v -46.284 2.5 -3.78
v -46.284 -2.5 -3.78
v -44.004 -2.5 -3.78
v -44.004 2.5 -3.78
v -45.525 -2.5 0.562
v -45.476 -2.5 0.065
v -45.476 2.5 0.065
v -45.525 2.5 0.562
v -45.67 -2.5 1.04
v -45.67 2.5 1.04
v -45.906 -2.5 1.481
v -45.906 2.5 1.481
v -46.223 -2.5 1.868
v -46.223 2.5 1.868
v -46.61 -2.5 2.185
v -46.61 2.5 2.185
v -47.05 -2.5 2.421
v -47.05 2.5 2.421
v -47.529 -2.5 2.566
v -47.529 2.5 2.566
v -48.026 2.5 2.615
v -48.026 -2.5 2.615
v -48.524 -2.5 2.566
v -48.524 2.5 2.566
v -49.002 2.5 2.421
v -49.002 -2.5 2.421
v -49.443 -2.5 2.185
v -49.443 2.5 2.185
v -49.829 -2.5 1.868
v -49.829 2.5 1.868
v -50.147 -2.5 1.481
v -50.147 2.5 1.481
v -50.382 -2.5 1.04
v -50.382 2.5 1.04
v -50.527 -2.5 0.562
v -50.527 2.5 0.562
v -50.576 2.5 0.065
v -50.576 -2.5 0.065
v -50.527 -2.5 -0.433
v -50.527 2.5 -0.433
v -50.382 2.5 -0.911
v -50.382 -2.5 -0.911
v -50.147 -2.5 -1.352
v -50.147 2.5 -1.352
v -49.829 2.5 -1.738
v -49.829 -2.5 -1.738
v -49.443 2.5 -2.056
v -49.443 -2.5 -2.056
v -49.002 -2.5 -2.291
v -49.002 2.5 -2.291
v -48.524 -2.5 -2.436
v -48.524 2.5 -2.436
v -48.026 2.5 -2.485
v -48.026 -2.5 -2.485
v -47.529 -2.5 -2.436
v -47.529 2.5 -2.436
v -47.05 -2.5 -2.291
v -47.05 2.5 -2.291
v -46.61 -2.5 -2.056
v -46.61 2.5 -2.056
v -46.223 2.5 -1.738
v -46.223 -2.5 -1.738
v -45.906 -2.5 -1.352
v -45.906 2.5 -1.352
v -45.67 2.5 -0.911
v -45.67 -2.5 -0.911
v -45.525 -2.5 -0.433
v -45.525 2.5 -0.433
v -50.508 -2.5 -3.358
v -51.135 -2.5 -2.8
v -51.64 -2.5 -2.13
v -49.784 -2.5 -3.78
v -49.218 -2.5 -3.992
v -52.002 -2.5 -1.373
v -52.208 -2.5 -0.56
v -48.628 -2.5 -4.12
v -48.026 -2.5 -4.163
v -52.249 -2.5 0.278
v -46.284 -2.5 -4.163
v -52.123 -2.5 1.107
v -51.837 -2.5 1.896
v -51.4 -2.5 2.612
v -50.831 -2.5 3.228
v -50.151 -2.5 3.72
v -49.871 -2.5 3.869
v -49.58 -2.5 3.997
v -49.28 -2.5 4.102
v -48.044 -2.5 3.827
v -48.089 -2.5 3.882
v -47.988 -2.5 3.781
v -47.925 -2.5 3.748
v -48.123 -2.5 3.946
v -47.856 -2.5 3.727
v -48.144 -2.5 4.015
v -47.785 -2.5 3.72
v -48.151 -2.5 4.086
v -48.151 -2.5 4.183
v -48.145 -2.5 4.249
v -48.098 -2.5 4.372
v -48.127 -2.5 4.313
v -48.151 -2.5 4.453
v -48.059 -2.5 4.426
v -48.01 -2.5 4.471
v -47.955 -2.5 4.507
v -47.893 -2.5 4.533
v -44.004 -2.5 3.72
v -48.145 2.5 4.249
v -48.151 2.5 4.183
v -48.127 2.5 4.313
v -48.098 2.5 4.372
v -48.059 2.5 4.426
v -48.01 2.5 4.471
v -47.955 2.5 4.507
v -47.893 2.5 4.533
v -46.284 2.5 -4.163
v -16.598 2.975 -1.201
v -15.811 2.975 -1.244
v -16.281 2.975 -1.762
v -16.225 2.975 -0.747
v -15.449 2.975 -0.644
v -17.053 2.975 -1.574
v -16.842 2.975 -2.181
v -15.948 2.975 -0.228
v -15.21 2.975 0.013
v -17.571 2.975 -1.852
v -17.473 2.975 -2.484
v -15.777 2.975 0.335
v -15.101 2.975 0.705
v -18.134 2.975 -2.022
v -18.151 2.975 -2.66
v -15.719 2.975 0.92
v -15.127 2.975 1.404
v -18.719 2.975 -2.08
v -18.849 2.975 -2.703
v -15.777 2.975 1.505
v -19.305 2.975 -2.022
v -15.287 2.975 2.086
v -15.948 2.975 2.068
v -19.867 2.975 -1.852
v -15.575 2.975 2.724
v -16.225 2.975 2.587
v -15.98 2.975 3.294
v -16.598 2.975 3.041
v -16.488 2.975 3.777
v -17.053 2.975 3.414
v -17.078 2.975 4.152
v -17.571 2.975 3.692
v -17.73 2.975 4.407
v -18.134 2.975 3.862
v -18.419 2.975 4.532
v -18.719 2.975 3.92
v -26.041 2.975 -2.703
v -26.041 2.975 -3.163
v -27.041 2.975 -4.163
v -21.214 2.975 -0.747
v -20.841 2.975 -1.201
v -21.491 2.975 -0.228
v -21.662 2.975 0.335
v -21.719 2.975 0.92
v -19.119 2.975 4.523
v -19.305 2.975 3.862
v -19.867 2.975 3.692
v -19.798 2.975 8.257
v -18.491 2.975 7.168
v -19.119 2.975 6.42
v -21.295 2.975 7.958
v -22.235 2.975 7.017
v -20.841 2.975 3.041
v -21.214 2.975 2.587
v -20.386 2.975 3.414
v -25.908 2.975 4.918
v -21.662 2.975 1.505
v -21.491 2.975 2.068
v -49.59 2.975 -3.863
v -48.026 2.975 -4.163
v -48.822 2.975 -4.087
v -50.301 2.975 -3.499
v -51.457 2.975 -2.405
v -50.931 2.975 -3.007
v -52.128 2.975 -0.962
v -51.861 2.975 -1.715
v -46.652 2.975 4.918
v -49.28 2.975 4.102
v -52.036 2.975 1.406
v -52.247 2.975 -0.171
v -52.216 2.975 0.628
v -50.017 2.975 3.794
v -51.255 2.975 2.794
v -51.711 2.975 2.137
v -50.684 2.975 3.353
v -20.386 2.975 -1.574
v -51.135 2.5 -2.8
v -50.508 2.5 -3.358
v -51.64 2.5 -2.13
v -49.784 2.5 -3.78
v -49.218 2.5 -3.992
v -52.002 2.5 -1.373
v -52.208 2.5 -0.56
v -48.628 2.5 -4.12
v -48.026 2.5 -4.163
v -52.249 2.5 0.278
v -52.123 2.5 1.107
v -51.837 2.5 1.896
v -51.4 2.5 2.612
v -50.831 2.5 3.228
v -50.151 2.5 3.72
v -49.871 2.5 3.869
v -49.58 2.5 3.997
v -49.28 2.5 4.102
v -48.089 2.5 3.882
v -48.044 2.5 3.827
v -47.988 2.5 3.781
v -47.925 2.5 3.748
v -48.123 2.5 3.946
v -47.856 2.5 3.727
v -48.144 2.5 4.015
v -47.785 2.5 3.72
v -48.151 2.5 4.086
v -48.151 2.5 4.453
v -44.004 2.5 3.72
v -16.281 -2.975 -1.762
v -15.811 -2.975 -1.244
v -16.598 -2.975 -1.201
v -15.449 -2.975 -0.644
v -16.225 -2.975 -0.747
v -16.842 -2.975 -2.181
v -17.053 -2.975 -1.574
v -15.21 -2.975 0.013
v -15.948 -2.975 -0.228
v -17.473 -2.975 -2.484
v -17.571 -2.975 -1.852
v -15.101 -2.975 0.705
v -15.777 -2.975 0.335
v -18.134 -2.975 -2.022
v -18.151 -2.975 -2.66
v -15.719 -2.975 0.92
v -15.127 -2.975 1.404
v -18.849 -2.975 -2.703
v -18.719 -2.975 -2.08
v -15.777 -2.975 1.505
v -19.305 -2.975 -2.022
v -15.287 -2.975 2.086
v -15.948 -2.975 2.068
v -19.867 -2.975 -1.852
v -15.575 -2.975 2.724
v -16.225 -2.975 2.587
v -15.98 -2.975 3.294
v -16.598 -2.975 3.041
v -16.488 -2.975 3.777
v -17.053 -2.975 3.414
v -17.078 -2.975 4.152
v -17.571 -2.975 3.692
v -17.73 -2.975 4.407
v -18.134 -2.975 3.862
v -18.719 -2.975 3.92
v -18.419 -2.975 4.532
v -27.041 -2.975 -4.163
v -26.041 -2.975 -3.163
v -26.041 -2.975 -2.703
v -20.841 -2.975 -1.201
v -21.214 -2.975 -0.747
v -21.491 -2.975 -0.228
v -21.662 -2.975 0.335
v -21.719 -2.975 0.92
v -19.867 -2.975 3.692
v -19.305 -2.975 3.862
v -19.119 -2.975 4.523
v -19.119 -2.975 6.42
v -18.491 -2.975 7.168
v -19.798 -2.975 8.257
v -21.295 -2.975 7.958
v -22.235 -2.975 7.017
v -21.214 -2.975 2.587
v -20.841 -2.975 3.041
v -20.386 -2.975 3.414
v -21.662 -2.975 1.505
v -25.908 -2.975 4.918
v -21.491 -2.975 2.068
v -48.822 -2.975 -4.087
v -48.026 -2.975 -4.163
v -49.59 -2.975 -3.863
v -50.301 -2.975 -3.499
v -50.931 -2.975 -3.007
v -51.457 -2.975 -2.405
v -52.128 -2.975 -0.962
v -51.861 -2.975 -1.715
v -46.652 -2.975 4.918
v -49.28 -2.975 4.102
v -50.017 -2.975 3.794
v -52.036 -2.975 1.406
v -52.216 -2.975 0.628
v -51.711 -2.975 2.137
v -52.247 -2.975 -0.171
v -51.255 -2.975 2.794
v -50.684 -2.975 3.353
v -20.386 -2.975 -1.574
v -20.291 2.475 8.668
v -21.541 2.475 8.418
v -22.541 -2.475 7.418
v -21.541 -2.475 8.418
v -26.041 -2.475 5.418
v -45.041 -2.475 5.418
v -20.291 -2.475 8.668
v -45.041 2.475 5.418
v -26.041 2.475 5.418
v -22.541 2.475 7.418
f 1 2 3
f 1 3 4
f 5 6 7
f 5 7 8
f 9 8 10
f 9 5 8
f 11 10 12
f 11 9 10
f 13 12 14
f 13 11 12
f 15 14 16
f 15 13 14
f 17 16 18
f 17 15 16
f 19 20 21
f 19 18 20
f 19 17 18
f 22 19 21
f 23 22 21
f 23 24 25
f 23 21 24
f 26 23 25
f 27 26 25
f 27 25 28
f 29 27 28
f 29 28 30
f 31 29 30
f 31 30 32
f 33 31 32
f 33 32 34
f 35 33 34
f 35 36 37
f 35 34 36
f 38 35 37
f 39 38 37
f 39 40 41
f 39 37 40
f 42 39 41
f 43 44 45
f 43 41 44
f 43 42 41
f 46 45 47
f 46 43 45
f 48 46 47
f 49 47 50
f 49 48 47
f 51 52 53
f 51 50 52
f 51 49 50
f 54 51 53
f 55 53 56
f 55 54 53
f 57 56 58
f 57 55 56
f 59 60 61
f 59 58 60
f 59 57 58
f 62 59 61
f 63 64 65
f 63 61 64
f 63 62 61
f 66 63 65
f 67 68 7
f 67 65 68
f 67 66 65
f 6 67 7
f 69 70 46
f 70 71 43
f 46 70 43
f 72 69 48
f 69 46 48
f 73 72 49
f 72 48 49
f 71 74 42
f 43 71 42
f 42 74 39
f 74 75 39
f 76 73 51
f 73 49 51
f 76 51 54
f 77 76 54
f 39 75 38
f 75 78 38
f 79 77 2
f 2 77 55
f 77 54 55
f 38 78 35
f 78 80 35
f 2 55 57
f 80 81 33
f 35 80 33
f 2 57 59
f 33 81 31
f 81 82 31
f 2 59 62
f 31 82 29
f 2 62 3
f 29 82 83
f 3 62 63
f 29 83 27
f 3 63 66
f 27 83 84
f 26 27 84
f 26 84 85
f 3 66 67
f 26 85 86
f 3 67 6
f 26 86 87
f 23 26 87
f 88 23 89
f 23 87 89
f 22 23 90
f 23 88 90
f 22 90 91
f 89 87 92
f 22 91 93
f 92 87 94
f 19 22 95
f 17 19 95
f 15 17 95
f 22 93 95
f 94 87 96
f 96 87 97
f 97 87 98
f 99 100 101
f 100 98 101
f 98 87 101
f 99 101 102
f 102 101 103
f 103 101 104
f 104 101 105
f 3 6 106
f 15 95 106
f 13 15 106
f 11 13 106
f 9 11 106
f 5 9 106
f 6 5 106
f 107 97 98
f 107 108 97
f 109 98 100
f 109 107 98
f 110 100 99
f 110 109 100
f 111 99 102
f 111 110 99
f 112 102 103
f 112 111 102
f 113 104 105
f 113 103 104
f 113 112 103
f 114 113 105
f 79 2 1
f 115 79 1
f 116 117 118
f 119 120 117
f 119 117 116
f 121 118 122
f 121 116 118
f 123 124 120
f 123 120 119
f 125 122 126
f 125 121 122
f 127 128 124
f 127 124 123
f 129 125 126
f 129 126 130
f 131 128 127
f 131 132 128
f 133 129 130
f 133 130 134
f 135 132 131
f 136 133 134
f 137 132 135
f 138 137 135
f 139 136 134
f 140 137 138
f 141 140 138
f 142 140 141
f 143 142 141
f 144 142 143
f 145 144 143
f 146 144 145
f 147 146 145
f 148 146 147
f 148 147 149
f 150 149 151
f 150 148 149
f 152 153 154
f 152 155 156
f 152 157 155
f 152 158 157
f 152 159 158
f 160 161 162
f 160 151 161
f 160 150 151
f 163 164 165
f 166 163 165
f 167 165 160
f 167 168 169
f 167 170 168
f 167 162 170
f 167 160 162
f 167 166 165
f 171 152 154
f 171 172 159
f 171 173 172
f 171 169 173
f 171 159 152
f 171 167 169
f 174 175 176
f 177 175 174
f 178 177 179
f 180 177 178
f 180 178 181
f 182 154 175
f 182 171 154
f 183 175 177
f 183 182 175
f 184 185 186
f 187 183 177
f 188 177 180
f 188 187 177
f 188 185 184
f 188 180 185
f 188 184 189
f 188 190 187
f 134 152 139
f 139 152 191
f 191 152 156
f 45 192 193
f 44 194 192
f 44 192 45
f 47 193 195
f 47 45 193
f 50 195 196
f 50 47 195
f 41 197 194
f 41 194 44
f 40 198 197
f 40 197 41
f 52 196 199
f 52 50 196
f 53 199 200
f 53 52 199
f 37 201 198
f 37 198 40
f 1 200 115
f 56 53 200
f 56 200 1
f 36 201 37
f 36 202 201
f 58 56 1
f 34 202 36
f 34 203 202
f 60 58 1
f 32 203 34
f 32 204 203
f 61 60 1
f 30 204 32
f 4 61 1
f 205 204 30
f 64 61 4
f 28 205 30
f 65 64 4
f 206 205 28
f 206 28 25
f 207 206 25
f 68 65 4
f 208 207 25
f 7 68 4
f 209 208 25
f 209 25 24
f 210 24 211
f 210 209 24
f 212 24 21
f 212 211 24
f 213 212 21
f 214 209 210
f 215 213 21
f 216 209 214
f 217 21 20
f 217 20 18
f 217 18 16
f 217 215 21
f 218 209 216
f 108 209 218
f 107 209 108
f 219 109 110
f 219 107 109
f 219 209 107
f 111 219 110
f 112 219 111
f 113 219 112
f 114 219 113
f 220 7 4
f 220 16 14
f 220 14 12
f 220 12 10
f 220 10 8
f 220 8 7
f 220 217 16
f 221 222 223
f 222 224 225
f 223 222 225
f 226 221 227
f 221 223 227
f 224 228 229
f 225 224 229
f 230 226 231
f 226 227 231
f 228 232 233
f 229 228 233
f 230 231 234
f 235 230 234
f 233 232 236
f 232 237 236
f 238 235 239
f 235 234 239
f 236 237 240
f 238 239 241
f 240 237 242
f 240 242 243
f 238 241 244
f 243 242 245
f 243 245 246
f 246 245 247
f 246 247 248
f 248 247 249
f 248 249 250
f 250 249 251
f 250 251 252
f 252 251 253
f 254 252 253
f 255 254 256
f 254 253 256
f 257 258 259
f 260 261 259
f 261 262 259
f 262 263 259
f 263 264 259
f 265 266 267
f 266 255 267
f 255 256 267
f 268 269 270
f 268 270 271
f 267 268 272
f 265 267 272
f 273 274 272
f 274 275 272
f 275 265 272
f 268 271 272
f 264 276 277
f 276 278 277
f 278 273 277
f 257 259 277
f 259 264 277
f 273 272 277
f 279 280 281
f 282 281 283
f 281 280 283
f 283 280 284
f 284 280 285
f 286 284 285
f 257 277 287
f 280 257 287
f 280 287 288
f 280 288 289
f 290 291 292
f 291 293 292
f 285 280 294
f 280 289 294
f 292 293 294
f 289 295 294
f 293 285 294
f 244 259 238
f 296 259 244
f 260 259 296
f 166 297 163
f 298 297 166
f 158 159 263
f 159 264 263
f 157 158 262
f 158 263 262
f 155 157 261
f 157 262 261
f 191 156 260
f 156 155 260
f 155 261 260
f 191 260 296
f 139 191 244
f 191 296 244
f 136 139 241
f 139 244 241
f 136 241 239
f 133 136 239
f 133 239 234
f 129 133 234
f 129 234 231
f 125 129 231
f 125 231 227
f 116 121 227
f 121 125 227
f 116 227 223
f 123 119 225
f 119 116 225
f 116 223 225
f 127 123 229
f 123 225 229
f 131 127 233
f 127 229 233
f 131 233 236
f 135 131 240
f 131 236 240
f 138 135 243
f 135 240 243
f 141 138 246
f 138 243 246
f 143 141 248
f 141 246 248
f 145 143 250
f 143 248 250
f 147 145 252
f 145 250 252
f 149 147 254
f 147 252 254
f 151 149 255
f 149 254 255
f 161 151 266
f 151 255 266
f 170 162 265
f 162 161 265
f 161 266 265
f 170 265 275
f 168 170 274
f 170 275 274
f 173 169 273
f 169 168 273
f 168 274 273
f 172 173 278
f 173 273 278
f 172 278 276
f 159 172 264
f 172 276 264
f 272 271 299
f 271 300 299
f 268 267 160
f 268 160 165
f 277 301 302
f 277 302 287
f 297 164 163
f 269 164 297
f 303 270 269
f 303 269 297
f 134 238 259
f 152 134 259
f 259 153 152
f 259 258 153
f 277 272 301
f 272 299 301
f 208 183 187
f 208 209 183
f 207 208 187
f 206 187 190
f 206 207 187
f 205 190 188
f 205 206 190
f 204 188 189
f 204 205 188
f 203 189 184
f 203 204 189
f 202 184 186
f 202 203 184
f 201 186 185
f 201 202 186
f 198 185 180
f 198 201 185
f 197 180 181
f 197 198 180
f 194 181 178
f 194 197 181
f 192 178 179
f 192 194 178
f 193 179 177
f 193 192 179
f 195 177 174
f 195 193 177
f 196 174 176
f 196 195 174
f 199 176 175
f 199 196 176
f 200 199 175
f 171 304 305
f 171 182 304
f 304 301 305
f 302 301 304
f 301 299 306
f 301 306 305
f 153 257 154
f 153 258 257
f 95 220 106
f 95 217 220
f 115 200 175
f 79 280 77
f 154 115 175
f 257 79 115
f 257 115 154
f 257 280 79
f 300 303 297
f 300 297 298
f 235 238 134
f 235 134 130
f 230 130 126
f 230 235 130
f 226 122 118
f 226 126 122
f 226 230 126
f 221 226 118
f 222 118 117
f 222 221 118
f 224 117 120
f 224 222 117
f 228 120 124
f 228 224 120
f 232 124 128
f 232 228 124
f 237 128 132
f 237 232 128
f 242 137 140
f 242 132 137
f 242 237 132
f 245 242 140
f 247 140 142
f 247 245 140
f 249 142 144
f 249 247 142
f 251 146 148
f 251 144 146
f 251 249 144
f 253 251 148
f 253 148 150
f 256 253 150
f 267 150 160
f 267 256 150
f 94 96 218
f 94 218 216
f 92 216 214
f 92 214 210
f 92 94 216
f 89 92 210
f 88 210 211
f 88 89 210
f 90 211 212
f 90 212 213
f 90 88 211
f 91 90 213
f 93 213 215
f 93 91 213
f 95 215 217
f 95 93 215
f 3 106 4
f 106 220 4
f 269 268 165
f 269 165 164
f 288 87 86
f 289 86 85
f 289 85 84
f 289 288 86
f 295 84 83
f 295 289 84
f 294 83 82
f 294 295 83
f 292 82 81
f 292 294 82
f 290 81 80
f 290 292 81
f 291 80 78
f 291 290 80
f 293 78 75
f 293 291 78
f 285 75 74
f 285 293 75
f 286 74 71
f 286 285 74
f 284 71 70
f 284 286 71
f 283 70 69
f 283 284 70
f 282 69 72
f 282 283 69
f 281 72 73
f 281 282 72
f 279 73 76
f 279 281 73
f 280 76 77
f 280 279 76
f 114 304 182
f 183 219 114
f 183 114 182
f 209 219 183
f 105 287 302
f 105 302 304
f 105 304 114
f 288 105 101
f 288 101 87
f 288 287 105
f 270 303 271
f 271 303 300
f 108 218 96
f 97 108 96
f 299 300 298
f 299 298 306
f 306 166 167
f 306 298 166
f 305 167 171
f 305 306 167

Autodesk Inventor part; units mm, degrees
ref_plane "YZ Plane" through (0, 0, 0) normal (1, 0, 0) x (0, 1, 0)
ref_plane "XZ Plane" through (0, 0, 0) normal (0, 1, 0) x (-1, 0, 0)
sketch "Sketch1" plane through (0, 0, 0) normal (0, 1, 0) x (-1, 0, 0)
  circle A0 centre (18.719305, 0.91995) radius 3.625
  line L0 (19.118903, 4.522858) -> (19.118903, 6.41995)
  line L1 (19.118903, 6.41995) -> (18.491054, 7.168191)
  line L2 (18.491054, 7.168191) -> (20.291054, 8.668191)
  line L3 (20.291054, 8.668191) -> (21.541054, 8.418191)
  line L4 (21.541054, 8.418191) -> (22.541054, 7.418191)
  line L5 (22.541054, 7.418191) -> (26.041054, 5.418191)
  line L6 (26.041054, -4.16305) -> (26.041054, 5.418191)
  line L7 (26.041054, 5.418191) -> (45.041054, 5.418191)
  line L8 (45.041054, 5.418191) -> (49.279808, 4.102266)
  line L9 (18.849216, -2.702721) -> (26.041054, -2.702721)
  circle A1 centre (48.026329, 0.064657) radius 4.227707
  line L10 (48.026329, -4.16305) -> (26.041054, -4.16305)
  circle A2 centre (18.719305, 0.91995) radius 3
  point P0 (0, 0)
  dimension "d0" = 7.25
  dimension "d1" = 5.5
  dimension "d2" = 140
  dimension "d3" = 1.5
  dimension "d4" = 1.8
  dimension "d5" = 1.25
  dimension "d6" = 0.25
  dimension "d7" = 1
  dimension "d8" = 1
  dimension "d9" = 3.5
  dimension "d10" = 2
  dimension "d11" = 19
  dimension "d12" = 6
  dimension "d15" = 5.083
extrude "Extrusion1" add sketch "Sketch1" along normal mid plane 5.95
ref_plane "Work Plane1" through (-52.254036, 0, 0.064657) normal (1, 0, 0) x (0, 0, -1)
sketch "Sketch2" plane through (-52.254036, 0, 0.064657) normal (1, 0, 0) x (0, 0, -1)
  point P0 (0.064657, 0)
sketch "Sketch3" plane through (-52.254036, 0, 0.064657) normal (1, 0, 0) x (0, 0, -1)
  line L0 (-4.03761, -2.975) -> (4.227707, -2.975) construction
  line L1 (4.227707, 2.975) -> (-4.03761, 2.975) construction
  line L2 (-4.03761, -2.975) -> (-4.03761, 2.975) construction
  line L3 (2.767378, 2.975) -> (4.227707, 2.975) construction
  line L4 (-4.03761, -2.975) -> (4.227707, 2.975) construction
  line L5 (4.227707, -2.975) -> (4.227707, 2.975) construction
  line L6 (4.227707, -2.975) -> (0.095048, 0) construction
  line L7 (-3.654952, -2.5) -> (3.845048, -2.5)
  line L8 (3.845048, -2.5) -> (3.845048, 2.5)
  line L9 (3.845048, 2.5) -> (-3.654952, 2.5)
  line L10 (-3.654952, 2.5) -> (-3.654952, -2.5)
  line L11 (-3.654952, -2.5) -> (3.845048, 2.5) construction
  line L12 (3.845048, -2.5) -> (-3.654952, 2.5) construction
  point P0 (0.064657, 0)
  dimension "d16" = 7.5
  dimension "d17" = 5
extrude "Extrusion2" cut sketch "Sketch3" along normal blind 8.25
sketch "Sketch4" plane through (-50.151142, -2.5, 3.719608) normal (0, 1, 0) x (1, 0, 0)
  arc A0 (2.124813, 7.882658) -> (0.871334, -0.382658) centre (2.124813, 3.654952) ccw
  circle A1 centre (2.124813, 3.654952) radius 2.55
  point P0 (50.151142, 3.719608)
  dimension "d20" = 5.1
extrude "Extrusion3" add sketch "Sketch4" along normal up to surface (5 mm away)
sketch "Sketch5" plane through (-49.783914, -2.5, -3.780392) normal (0, 0, 1) x (1, 0, 0)
  line L0 (0, 0) -> (0, 5) projected
  line L1 (0, 0) -> (3.5, 0)
  line L2 (3.5, 0) -> (3.5, 5)
  line L3 (0, 5) -> (3.5, 5)
  point P0 (49.783914, 2.5)
  point P1 (3.5, 0.293722)
  dimension "d23" = 3.5
extrude "Extrusion4" cut sketch "Sketch5" against normal blind 4.25
sketch "Sketch6" plane through (-44.004036, 2.5, 3.719608) normal (0, 0, -1) x (-1, 0, 0)
  line L0 (6.147107, 0) -> (0, 0)
  line L1 (6.147107, 0) -> (4.147107, 0)
  line L2 (4.147107, 0) -> (4.147107, -5)
  line L3 (4.147107, -5) -> (6.147107, -5)
  line L4 (6.147107, -5) -> (6.147107, 0)
  line L5 (6.147107, -5) -> (0, -5)
  point P0 (-44.004036, -2.5)
  point P1 (4.147107, 0)
  dimension "d26" = 2
extrude "Extrusion5" cut sketch "Sketch6" against normal blind 4.25
fillet "Fillet1" radius 0.3665 2 edges at (-48.1511, 0, 4.4527) (-48.1511, 0, 3.7196)
chamfer "Chamfer1" distance 0.5 angle 45 8 edges at (-35.5411, -2.975, 5.4182) (-35.5411, 2.975, 5.4182) (-24.2911, 2.975, 6.4182) (-24.2911, -2.975, 6.4182) (-22.0411, -2.975, 7.9182) (-22.0411, 2.975, 7.9182) (-20.9161, 2.975, 8.5432) (-20.9161, -2.975, 8.5432)
chamfer "Chamfer2" distance 1 angle 45 1 edges at (-26.0411, 0, -4.1631)
properties part number "Lower Leg"
